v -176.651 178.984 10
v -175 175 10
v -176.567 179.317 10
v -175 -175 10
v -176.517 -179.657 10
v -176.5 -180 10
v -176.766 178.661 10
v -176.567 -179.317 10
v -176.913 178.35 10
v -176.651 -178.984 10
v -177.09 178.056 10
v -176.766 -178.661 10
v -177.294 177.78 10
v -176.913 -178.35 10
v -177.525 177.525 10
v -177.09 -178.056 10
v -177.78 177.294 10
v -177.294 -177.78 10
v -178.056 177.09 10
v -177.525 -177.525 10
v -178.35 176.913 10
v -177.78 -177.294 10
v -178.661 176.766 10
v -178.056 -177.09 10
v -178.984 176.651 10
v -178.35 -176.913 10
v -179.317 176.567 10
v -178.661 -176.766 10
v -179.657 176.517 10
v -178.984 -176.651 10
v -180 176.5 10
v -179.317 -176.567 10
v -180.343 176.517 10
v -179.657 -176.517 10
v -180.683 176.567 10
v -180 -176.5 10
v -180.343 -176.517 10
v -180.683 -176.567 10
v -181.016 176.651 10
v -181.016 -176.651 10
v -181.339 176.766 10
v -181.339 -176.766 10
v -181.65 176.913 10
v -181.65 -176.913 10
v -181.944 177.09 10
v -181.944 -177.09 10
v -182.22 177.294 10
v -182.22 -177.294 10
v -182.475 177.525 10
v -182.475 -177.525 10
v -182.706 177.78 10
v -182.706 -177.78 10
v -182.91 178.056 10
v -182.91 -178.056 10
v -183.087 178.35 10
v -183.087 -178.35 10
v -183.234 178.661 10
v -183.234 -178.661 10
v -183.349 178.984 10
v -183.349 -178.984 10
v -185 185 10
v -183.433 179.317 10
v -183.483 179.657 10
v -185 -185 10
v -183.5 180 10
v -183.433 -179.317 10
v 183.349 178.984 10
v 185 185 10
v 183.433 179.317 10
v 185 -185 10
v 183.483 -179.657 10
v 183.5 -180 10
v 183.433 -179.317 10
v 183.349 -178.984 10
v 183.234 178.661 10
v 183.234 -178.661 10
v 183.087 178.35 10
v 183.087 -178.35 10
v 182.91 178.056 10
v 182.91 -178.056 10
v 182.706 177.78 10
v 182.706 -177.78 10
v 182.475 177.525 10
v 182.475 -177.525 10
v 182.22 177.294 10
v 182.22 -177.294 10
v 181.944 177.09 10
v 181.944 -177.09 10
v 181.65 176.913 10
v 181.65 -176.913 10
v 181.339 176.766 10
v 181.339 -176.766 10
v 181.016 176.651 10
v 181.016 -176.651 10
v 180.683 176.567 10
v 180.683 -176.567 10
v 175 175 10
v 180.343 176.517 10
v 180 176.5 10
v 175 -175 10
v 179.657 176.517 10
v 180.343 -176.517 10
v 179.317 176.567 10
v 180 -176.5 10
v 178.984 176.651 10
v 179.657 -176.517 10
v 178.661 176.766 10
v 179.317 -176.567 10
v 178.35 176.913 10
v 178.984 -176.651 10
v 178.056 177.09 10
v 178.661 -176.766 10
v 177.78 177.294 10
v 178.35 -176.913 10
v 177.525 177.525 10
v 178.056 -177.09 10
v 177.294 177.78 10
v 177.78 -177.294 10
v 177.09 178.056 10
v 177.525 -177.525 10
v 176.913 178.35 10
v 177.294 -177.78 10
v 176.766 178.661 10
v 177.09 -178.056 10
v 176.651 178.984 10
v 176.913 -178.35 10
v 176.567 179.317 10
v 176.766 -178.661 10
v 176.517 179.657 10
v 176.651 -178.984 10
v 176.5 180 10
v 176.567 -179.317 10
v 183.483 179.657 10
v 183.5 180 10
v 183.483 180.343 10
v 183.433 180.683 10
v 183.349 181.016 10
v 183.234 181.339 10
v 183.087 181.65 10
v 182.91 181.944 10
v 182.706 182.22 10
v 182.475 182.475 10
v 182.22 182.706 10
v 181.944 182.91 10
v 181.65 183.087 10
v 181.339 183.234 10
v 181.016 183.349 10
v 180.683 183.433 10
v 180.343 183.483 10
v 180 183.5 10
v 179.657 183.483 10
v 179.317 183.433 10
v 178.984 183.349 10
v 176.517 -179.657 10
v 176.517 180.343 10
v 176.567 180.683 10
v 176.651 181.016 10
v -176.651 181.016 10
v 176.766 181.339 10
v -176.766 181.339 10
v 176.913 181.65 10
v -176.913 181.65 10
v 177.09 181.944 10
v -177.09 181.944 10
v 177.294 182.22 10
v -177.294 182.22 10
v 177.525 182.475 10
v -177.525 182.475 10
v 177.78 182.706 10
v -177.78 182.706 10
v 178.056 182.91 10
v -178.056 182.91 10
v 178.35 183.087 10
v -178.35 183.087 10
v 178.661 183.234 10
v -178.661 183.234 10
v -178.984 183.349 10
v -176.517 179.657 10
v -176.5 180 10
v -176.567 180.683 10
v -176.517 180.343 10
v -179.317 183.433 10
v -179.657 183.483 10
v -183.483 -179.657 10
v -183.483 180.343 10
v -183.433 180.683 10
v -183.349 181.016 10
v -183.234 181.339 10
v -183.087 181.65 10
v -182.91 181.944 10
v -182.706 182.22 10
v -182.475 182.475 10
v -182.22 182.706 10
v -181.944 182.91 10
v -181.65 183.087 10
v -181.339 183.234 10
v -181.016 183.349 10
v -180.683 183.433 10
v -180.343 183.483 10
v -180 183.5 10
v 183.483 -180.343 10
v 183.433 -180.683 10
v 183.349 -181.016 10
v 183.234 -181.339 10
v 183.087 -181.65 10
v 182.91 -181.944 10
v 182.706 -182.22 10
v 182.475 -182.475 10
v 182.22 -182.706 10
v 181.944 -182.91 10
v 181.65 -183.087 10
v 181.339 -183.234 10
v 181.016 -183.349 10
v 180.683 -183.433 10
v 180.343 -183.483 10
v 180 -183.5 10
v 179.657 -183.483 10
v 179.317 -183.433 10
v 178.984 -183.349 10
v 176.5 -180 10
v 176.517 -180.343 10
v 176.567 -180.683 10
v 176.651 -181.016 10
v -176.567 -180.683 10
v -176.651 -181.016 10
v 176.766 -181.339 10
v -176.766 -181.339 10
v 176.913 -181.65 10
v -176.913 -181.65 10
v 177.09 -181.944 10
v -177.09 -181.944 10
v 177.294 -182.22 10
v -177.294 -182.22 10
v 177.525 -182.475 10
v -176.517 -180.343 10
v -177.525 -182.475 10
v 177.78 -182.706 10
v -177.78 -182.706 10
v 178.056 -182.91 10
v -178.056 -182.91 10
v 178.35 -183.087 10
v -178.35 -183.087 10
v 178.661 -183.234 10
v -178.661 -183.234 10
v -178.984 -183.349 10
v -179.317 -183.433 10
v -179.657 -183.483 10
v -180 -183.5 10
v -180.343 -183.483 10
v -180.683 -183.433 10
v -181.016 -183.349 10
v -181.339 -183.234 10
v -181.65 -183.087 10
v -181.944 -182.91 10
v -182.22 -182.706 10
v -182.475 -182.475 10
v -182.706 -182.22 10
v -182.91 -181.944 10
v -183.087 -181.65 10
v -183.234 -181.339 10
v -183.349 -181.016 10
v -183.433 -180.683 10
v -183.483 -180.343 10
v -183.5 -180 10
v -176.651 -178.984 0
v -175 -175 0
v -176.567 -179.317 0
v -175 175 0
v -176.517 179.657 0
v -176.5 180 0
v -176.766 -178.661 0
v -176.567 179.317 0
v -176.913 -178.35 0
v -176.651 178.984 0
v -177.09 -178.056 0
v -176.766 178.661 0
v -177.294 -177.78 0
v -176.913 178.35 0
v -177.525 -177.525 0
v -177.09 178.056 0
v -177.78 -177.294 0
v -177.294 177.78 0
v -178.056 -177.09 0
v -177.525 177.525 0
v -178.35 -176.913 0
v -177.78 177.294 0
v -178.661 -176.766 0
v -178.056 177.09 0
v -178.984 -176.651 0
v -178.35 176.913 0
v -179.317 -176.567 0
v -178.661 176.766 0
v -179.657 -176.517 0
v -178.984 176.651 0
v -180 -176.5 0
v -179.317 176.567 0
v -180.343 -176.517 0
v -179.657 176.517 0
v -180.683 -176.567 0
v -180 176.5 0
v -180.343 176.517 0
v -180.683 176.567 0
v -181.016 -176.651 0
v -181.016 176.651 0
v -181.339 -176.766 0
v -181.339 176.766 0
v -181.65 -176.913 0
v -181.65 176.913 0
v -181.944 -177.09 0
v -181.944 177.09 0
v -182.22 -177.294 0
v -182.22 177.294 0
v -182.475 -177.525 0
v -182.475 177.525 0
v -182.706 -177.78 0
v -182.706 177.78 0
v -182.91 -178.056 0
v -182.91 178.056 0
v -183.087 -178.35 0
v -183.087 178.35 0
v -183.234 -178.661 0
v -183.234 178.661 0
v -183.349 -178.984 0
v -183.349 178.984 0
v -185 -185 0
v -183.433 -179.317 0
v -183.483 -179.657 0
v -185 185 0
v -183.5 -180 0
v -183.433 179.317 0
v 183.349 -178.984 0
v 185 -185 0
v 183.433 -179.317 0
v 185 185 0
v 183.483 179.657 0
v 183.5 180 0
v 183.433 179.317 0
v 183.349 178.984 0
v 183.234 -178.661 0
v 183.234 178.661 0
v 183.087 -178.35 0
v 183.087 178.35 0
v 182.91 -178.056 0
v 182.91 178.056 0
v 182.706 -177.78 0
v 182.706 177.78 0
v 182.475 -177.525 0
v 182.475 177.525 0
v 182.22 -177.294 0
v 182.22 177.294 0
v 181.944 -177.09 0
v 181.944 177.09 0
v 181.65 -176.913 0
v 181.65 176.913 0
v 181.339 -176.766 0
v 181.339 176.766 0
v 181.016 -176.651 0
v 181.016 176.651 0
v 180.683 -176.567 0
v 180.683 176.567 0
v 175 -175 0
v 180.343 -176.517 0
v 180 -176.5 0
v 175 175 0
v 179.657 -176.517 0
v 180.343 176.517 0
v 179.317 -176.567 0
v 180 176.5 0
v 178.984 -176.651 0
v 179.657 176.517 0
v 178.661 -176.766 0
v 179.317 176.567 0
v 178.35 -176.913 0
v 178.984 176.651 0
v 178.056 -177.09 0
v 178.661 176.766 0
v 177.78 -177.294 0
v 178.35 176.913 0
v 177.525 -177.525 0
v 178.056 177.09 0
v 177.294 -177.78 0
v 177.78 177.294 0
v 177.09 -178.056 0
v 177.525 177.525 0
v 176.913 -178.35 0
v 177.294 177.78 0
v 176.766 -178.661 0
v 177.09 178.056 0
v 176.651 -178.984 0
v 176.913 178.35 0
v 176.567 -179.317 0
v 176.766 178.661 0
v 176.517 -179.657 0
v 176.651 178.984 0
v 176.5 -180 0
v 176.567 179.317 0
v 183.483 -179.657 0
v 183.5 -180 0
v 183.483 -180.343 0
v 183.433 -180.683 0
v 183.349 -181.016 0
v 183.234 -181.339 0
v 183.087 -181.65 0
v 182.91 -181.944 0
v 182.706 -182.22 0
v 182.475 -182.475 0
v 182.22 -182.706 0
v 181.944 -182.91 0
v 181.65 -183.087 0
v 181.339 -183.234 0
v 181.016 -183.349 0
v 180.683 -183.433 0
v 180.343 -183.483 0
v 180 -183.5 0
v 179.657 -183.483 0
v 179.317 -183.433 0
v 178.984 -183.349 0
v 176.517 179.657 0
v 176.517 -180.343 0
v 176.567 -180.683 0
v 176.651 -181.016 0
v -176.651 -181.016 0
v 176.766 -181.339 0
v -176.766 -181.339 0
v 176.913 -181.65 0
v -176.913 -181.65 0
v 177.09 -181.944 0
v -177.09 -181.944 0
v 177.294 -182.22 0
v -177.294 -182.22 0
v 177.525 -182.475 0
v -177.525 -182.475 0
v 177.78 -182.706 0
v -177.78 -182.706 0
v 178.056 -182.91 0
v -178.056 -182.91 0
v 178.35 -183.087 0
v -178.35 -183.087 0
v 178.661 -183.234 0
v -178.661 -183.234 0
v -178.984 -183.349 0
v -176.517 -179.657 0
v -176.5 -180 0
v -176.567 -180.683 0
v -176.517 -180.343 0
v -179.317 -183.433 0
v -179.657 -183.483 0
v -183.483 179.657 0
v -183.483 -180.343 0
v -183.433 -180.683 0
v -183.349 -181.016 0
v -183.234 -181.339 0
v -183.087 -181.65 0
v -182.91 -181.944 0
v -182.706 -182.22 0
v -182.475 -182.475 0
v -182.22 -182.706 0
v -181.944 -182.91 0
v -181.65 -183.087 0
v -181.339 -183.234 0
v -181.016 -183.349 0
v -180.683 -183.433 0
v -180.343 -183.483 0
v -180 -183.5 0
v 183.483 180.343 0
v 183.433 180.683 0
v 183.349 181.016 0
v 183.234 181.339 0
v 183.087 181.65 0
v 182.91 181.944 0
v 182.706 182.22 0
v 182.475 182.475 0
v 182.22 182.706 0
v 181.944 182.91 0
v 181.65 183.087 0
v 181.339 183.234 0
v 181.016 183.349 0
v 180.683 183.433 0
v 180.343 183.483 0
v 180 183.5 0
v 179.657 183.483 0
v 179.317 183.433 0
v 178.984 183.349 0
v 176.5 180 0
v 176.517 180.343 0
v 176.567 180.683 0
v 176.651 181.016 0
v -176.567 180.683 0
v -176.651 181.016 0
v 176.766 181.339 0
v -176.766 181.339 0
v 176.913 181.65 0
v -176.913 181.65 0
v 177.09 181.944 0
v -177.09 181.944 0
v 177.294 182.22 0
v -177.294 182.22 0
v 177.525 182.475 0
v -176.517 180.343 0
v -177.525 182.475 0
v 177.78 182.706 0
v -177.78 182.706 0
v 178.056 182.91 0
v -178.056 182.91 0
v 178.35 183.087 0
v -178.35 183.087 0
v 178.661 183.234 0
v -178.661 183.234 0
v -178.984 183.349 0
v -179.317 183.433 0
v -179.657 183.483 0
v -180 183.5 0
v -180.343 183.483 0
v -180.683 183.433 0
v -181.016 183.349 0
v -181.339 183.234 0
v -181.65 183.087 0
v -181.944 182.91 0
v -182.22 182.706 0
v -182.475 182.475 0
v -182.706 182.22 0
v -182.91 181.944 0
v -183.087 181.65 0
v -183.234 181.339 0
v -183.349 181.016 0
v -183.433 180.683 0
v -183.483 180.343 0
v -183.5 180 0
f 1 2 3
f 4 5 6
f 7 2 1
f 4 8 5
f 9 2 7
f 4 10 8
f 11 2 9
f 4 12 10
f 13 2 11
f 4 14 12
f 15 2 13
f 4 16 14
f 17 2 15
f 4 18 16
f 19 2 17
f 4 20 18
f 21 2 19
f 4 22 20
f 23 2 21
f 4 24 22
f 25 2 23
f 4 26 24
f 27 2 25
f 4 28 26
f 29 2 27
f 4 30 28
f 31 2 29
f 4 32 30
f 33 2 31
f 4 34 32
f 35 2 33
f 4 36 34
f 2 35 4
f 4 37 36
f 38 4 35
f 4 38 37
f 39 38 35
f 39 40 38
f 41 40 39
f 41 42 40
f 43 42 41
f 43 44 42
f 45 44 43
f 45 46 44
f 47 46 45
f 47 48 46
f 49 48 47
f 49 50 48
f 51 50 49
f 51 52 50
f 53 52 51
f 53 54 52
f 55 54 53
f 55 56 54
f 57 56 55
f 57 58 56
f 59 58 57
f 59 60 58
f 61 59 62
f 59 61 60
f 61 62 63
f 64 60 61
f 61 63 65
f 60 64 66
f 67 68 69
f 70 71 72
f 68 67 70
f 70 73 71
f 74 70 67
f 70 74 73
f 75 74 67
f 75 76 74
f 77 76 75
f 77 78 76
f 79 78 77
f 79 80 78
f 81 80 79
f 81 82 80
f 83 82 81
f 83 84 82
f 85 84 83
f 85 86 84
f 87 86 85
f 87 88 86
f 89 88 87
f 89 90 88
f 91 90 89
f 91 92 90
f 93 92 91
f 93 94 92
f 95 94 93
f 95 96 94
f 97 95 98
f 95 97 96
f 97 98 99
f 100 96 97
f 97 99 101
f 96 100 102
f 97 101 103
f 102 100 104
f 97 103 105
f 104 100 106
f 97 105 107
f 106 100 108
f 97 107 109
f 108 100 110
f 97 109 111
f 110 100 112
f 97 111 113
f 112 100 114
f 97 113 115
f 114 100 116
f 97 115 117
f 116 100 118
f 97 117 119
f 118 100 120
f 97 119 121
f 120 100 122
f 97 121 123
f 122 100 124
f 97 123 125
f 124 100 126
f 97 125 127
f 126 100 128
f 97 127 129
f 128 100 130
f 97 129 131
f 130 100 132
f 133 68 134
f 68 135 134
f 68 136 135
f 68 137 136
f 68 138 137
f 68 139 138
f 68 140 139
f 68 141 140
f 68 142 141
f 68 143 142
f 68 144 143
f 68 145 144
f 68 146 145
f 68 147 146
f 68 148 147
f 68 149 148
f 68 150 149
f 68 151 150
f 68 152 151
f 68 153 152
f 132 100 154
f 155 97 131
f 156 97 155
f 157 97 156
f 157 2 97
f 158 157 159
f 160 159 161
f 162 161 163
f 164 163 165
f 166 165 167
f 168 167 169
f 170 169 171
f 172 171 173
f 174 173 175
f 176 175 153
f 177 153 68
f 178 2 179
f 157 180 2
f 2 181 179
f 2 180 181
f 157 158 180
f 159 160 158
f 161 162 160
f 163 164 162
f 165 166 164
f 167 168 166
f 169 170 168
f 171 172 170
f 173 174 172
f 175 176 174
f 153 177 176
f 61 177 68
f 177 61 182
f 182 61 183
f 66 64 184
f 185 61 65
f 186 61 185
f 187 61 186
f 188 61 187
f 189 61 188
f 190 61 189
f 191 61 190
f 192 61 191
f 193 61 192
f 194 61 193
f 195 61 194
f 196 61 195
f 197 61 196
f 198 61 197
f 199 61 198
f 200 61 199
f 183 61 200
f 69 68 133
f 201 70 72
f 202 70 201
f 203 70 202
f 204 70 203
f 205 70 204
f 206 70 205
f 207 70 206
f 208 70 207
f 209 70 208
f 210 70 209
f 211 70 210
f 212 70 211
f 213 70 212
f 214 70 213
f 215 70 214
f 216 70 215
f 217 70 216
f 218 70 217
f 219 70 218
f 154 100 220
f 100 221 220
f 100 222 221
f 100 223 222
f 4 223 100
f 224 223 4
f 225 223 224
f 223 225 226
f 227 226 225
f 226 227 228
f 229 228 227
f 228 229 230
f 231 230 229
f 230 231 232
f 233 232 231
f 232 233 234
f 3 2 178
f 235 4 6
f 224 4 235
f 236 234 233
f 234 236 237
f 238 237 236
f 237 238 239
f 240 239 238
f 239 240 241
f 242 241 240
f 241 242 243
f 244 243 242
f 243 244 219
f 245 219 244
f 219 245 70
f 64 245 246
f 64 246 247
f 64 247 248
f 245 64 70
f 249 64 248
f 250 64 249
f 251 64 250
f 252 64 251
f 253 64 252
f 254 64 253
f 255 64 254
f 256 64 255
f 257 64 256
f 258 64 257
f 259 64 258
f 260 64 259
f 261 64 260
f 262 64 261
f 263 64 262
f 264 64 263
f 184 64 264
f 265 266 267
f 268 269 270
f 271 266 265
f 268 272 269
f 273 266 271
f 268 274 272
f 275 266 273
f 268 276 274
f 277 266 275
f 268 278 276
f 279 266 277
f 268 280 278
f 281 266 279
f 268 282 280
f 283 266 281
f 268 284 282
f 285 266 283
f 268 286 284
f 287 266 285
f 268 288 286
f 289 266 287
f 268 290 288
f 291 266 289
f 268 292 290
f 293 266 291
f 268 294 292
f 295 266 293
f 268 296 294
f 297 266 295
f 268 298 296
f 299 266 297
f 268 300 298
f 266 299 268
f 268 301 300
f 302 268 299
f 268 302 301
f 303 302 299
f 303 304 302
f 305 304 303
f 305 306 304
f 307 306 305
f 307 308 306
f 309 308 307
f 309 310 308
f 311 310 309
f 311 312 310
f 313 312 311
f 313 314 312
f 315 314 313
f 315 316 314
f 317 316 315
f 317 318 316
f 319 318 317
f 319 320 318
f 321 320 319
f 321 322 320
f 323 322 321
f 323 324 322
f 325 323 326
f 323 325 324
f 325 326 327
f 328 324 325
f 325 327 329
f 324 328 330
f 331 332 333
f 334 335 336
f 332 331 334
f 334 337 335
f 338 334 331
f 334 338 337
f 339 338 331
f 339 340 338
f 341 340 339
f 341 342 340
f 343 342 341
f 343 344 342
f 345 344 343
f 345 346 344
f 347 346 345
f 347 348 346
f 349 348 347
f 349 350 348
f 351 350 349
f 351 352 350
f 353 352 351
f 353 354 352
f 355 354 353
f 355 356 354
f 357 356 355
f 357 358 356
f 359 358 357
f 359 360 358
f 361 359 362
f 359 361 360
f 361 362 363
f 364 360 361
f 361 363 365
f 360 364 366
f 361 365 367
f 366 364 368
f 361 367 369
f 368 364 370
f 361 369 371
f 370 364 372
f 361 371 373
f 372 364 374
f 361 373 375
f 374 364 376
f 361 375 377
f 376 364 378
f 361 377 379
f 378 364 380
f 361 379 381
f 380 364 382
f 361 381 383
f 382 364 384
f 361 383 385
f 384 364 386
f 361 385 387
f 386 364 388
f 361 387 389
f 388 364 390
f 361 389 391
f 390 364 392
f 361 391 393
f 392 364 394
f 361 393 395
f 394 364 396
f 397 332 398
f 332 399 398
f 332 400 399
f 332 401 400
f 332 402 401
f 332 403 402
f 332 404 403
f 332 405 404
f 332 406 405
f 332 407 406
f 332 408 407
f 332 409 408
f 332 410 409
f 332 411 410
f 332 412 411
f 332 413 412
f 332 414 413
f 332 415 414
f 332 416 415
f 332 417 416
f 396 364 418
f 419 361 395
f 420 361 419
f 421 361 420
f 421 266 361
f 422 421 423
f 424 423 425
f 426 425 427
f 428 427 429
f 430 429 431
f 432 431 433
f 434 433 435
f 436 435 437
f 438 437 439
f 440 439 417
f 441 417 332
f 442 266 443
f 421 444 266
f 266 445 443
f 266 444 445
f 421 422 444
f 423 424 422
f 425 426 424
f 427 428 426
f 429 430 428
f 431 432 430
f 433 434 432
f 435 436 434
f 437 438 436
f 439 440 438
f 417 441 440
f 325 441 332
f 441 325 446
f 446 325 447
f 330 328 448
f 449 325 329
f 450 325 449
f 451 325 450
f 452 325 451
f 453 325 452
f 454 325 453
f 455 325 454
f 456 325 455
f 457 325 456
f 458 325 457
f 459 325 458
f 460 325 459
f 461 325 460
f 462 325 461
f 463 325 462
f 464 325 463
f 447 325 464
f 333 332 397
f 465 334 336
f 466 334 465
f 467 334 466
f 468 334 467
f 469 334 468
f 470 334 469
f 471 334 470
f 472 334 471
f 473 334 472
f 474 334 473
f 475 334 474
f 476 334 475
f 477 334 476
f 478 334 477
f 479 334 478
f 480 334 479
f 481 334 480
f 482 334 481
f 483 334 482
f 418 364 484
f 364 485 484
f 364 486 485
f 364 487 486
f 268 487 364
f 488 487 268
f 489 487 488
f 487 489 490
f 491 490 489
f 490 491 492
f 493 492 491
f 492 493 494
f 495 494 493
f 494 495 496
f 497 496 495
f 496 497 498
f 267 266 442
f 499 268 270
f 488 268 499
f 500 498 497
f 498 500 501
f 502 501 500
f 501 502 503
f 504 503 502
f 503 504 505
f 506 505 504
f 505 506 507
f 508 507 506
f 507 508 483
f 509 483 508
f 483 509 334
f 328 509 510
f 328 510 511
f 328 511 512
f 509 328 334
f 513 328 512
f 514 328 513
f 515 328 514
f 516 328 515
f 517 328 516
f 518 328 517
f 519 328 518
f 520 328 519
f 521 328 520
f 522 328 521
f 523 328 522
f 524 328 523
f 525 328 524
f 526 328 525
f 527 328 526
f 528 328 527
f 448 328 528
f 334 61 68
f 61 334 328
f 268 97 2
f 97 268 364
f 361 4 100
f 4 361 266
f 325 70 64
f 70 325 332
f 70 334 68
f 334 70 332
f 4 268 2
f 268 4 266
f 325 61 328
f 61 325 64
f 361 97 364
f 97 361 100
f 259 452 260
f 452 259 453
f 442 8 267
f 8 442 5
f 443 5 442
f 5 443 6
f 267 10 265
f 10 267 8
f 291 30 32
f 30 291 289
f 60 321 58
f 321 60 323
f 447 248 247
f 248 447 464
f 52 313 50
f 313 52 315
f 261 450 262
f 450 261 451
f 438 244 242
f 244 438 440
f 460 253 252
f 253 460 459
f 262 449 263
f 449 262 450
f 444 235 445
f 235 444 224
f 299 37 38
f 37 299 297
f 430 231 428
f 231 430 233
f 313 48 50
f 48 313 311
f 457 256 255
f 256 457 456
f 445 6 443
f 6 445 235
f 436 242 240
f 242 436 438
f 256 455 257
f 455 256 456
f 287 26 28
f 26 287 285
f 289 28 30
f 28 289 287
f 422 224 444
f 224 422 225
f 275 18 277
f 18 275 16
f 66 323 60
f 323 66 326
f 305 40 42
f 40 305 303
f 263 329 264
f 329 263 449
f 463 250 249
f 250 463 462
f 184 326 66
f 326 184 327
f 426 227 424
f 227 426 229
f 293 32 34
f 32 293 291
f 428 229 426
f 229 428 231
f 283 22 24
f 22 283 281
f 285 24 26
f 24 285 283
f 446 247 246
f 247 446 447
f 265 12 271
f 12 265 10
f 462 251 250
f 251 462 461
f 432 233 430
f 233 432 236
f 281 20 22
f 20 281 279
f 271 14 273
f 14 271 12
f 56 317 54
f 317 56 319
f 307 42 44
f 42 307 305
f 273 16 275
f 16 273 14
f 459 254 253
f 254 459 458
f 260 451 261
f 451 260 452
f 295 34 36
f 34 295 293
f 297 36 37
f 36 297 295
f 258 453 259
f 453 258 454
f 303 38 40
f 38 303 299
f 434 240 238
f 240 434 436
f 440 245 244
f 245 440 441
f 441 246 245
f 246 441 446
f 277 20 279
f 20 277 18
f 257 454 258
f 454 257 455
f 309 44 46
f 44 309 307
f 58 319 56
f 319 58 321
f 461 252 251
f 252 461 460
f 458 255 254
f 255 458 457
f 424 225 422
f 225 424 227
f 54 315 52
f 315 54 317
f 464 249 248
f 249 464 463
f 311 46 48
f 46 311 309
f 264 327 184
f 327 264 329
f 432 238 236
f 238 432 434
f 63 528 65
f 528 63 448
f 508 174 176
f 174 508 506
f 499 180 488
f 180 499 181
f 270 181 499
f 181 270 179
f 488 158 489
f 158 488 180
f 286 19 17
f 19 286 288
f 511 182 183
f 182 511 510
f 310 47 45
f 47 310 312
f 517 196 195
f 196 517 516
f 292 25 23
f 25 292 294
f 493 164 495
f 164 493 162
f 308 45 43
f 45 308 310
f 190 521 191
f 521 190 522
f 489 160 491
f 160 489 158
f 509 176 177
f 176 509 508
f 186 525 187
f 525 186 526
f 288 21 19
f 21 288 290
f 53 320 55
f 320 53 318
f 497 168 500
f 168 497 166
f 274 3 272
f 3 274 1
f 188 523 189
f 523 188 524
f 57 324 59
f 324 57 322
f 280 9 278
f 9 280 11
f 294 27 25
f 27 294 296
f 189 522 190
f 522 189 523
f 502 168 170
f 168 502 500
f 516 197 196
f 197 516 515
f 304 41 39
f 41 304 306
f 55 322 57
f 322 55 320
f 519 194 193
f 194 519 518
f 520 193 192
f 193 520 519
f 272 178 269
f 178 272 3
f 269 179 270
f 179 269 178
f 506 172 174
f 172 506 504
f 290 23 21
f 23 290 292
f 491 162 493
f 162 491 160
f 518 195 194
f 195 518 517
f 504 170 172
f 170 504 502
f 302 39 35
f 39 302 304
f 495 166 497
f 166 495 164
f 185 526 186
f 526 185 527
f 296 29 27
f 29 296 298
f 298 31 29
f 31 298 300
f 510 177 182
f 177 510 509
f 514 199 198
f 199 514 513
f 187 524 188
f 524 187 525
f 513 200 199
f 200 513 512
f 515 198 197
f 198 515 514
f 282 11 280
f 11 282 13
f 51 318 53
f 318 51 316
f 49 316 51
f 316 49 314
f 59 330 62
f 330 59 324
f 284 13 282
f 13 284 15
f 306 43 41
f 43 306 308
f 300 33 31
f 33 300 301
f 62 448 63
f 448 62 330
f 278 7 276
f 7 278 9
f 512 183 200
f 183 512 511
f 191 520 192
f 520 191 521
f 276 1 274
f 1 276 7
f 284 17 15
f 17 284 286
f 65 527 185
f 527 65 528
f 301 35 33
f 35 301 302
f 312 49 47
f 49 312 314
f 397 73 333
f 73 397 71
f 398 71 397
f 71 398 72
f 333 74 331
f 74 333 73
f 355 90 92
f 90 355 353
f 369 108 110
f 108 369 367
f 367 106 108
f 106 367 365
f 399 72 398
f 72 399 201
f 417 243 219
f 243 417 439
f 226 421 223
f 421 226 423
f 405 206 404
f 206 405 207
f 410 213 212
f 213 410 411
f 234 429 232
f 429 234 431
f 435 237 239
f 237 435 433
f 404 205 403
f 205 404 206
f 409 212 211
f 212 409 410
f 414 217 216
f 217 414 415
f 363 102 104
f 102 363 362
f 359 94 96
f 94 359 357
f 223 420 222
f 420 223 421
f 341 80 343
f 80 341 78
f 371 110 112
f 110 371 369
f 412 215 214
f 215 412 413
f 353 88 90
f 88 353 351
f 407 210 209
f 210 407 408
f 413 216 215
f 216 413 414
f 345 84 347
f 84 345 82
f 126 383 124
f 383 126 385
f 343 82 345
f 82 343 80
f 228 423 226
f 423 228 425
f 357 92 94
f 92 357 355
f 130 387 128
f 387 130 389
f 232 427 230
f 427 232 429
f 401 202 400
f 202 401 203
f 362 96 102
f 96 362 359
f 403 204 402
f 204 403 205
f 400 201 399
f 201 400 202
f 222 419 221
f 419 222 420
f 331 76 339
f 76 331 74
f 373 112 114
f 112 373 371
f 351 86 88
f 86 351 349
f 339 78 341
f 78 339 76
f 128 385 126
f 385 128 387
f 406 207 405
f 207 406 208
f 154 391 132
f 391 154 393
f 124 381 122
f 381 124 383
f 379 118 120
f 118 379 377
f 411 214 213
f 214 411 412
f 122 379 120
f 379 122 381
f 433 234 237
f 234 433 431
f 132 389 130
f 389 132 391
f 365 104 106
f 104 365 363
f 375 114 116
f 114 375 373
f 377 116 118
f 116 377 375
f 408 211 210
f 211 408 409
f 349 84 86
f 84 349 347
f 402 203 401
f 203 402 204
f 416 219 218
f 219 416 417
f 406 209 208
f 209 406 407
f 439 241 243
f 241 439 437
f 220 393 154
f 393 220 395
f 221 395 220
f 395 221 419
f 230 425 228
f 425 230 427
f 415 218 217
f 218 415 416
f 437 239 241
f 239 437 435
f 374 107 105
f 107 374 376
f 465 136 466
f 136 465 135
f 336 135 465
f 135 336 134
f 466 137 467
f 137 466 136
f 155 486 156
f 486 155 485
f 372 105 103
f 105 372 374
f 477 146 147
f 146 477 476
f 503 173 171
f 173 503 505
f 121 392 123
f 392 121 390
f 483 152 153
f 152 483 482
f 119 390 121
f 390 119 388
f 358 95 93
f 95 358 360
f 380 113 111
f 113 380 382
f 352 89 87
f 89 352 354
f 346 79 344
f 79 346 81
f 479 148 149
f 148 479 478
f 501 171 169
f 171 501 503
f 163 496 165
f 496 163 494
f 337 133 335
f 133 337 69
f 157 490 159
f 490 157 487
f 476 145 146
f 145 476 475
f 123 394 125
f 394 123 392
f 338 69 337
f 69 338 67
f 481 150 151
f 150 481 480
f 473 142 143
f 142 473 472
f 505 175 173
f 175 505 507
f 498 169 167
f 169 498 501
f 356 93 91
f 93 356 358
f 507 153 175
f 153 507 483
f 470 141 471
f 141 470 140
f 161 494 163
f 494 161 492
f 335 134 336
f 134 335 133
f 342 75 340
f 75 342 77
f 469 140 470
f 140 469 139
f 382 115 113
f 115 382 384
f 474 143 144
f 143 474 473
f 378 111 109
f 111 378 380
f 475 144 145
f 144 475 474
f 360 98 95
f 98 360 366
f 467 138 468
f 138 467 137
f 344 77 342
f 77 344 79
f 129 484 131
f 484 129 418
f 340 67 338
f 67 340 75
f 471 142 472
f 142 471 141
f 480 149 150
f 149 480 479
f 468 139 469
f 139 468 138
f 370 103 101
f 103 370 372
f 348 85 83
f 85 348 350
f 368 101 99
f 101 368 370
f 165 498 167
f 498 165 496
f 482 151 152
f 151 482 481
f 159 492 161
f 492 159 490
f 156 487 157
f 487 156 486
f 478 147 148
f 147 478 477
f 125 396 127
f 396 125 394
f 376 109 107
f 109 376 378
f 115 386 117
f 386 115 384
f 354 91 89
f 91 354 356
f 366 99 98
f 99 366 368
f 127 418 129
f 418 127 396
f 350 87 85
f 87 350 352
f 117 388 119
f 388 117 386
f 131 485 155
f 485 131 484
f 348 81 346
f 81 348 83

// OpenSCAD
// ring_57.scad - ring index 57 (z bottom = 570 mm)
$fn = 64; bar = 10; half_b = bar/2; outer = 370; half_outer = outer/2;
front_y = 180; back_y = -180; left_x = -180; right_x = 180;
x_centers = [-170, -100, -30, 40, 110, 180];
z_centers = [5, 85, 155, 225, 295, 365, 435, 505, 575, 645, 715]; ring_z = 570;
module place_box(cx, cy, sx, sy) { translate([cx - sx/2, cy - sy/2, 0]) cube([sx, sy, bar]); }

difference() { union() {
    for (x = x_centers) { place_box(x, front_y, bar, bar); place_box(x, back_y, bar, bar); }
    for (y = x_centers) { place_box(left_x, y, bar, bar); place_box(right_x, y, bar, bar); }
    for (zc = z_centers) if ((zc - half_b < ring_z + bar) && (zc + half_b > ring_z)) {
        translate([-half_outer, front_y - half_b, 0]) cube([outer, bar, bar]);
        translate([-half_outer, back_y - half_b, 0])  cube([outer, bar, bar]);
        translate([left_x - half_b, -half_outer, 0])  cube([bar, outer, bar]);
        translate([right_x - half_b, -half_outer, 0]) cube([bar, outer, bar]);
    }
  }
  for (cx = [-180, 180]) for (cy = [-180, 180]) translate([cx, cy, 0]) cylinder(h = bar, r = 3.5, $fn = 64);
}
